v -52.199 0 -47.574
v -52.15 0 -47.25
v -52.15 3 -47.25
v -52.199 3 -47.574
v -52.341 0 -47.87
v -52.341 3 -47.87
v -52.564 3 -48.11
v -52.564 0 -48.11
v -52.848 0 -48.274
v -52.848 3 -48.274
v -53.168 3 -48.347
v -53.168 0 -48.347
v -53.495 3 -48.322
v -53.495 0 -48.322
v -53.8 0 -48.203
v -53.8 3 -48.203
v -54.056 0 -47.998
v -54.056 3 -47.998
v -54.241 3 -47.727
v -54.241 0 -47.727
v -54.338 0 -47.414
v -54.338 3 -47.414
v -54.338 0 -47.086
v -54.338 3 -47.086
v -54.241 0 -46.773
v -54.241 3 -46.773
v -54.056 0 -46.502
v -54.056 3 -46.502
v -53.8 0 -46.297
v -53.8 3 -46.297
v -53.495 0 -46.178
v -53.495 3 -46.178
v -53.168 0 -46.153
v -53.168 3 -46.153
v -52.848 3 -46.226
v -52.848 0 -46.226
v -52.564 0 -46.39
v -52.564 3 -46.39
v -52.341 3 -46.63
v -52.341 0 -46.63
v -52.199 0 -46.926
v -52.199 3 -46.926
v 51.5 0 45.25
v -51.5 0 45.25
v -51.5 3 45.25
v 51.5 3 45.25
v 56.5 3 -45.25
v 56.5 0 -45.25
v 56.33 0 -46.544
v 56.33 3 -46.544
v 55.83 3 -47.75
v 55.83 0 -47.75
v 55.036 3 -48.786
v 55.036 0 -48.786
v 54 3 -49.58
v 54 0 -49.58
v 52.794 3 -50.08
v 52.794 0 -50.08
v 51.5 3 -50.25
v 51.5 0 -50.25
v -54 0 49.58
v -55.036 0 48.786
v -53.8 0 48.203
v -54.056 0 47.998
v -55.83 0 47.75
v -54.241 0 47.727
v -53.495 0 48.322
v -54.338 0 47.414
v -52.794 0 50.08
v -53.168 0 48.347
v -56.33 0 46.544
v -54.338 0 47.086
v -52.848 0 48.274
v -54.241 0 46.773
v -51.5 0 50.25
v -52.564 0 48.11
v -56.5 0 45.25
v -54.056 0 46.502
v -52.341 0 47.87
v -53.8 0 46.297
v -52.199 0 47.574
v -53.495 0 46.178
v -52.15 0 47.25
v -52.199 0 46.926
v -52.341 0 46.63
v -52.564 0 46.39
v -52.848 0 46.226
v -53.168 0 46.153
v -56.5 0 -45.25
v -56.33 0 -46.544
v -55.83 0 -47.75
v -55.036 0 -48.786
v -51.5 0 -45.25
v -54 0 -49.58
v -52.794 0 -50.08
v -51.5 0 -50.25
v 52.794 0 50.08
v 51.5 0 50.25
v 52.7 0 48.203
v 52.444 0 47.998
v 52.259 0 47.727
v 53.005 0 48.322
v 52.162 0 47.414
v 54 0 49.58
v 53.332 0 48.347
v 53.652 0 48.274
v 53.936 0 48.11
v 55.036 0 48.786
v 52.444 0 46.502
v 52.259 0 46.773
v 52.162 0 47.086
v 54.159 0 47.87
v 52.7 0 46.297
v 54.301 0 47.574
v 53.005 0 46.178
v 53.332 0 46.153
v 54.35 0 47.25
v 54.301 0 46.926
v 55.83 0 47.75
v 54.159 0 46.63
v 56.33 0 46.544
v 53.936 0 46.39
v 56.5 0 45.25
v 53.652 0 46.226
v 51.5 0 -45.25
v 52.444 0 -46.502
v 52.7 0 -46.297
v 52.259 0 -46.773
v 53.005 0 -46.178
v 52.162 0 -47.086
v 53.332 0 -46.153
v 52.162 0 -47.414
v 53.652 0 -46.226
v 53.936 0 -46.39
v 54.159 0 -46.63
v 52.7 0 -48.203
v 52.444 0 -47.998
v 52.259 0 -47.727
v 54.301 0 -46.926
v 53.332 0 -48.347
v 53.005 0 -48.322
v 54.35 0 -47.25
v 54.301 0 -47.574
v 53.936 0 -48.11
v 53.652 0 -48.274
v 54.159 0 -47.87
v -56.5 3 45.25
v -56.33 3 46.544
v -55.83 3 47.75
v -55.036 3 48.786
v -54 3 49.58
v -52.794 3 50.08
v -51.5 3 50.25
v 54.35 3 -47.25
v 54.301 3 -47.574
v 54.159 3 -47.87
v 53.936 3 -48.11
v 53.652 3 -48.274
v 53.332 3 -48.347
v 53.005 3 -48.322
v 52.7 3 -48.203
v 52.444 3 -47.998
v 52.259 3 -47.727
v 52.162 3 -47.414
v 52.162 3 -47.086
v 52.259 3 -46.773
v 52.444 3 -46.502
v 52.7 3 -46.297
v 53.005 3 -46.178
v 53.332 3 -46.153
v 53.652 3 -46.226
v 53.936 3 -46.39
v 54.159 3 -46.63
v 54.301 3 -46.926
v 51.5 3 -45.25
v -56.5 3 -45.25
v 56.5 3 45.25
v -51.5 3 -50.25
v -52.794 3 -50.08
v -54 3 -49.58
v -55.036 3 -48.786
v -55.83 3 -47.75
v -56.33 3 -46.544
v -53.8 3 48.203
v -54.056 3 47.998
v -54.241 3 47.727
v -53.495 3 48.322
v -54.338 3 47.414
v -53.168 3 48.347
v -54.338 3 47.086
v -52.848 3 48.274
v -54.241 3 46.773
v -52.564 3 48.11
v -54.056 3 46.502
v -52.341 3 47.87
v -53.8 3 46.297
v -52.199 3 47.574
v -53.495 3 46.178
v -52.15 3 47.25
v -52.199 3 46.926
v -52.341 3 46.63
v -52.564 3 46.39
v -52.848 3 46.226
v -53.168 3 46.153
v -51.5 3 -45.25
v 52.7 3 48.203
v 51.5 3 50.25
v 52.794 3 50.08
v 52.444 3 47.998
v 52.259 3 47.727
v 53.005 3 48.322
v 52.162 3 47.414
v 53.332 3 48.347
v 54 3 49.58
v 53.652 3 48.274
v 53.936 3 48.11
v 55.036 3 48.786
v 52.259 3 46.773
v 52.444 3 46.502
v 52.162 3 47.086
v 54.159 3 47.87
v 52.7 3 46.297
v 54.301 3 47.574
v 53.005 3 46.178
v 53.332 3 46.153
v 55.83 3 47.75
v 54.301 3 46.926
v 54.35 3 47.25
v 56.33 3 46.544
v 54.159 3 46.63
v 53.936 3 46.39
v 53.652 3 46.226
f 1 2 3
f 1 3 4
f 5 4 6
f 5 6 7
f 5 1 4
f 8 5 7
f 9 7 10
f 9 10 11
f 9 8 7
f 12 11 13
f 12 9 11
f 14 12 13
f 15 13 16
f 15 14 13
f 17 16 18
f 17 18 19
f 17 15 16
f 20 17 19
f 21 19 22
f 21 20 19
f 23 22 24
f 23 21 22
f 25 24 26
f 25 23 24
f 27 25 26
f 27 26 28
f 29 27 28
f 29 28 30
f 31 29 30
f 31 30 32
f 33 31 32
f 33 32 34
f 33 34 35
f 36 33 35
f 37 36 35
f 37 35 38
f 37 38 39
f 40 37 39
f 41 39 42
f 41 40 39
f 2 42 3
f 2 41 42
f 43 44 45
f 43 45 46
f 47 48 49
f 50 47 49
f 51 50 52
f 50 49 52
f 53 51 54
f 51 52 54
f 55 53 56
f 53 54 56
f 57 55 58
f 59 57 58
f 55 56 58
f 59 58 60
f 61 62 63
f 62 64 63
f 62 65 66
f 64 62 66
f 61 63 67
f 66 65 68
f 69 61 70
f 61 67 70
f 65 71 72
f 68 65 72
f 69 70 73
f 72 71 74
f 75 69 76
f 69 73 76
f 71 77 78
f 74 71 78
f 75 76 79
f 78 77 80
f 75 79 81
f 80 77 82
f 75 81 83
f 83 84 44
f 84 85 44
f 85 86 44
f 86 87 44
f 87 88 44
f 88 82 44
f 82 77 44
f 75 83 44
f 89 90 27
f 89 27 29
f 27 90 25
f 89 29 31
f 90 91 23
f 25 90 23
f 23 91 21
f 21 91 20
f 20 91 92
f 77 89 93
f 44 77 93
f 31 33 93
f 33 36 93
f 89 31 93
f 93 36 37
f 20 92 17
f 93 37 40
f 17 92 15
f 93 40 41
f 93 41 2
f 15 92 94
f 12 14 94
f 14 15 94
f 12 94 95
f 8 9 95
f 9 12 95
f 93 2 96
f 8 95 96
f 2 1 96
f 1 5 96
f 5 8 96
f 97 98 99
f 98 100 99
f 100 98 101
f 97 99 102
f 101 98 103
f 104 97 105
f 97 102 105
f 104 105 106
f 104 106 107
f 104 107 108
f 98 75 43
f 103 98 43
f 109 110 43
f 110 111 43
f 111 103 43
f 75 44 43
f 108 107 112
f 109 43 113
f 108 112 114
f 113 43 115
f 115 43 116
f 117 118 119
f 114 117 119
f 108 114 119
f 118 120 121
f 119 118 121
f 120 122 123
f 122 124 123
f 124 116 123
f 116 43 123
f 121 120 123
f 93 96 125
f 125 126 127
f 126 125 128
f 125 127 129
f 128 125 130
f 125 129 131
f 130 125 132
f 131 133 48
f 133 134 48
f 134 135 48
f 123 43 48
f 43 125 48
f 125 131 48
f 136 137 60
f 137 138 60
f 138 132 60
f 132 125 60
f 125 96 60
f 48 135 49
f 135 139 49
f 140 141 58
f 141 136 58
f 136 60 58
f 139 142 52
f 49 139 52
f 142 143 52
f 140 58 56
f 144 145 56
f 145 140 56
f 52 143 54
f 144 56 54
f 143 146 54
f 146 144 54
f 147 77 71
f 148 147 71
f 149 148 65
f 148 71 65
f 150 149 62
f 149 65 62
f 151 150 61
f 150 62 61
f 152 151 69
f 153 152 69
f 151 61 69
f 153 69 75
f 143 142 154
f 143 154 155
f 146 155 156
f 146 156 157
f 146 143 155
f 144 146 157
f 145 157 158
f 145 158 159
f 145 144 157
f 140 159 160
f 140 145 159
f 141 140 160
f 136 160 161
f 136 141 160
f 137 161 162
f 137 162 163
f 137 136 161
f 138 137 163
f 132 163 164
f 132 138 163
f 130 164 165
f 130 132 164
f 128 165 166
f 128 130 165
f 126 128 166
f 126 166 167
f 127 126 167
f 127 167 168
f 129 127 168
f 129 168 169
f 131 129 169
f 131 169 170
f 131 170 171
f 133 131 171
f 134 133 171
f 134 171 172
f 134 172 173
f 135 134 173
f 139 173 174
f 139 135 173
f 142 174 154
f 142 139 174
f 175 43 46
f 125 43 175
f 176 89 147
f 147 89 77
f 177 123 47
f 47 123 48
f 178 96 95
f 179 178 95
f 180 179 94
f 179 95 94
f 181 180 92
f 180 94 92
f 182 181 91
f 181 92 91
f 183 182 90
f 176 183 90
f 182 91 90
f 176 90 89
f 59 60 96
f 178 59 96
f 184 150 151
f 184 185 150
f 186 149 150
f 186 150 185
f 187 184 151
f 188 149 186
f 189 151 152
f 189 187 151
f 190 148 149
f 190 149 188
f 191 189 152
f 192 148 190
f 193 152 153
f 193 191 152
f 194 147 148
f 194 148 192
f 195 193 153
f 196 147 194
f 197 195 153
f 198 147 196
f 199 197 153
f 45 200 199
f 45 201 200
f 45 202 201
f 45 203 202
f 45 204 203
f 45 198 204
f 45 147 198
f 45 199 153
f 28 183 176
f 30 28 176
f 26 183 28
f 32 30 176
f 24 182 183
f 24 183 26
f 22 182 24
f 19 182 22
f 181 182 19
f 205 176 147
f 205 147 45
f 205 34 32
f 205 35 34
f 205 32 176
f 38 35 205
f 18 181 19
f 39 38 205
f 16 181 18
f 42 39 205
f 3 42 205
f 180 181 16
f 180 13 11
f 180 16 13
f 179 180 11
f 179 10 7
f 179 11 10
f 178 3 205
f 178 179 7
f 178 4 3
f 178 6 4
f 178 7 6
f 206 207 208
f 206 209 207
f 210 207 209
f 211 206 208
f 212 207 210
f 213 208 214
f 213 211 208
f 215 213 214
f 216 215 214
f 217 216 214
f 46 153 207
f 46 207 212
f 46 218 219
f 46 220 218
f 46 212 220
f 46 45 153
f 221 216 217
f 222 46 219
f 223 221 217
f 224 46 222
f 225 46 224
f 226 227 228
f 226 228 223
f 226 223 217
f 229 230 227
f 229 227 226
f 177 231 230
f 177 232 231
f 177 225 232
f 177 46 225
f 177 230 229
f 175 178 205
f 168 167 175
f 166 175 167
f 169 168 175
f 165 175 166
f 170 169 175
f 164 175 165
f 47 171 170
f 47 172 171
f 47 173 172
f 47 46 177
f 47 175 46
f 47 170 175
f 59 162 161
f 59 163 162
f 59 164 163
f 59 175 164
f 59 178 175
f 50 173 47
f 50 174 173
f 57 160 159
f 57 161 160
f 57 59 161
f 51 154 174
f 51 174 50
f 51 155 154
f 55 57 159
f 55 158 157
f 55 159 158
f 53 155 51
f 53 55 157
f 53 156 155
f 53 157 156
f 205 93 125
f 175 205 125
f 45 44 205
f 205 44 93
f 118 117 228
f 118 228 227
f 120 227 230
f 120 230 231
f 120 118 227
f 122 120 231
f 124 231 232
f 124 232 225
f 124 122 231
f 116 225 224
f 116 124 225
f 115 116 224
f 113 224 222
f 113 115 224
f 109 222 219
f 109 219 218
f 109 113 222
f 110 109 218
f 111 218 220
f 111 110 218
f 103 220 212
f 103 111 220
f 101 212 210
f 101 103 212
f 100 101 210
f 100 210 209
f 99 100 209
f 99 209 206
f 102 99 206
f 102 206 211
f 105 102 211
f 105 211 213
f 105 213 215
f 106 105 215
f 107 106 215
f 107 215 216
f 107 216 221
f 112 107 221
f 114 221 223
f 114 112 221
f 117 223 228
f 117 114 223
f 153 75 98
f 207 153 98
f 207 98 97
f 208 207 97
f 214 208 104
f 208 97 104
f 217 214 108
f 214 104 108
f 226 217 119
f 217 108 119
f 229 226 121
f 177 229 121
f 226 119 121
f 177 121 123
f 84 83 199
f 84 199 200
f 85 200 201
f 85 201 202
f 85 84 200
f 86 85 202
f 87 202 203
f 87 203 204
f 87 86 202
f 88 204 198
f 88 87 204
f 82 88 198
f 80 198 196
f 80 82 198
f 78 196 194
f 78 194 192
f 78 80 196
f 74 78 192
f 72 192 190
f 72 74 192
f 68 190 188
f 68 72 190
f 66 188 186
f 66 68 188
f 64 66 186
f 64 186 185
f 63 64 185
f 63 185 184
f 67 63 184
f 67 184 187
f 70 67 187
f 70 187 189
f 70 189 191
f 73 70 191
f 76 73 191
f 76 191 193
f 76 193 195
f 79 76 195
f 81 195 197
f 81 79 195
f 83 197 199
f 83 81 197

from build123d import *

# Parameters (mm, degrees)
SKETCH1_R           = 1.1
SKETCH1_W           = 103
SKETCH1_H           = 90.5
BOSS_EXTRUDE1_DEPTH = 3


with BuildPart() as part:
    # Sketch1 → Boss-Extrude1 (new body)
    with BuildSketch(Plane(origin=(0, 0, 0), x_dir=(1, 0, 0), z_dir=(0, 1, 0))):
        with BuildLine():
            Line((-51.5, -50.25), (51.5, -50.25))
            ThreePointArc((51.5, -50.25), (55.035533906, -48.785533906), (56.5, -45.25))
            Line((56.5, -45.25), (56.5, 45.25))
            ThreePointArc((56.5, 45.25), (55.035533906, 48.785533906), (51.5, 50.25))
            Line((51.5, 50.25), (-51.5, 50.25))
            ThreePointArc((-51.5, 50.25), (-55.035533906, 48.785533906), (-56.5, 45.25))
            Line((-56.5, 45.25), (-56.5, -45.25))
            ThreePointArc((-56.5, -45.25), (-55.035533906, -48.785533906), (-51.5, -50.25))
        make_face()
        with Locations((-53.25, 47.25)):
            Circle(SKETCH1_R, mode=Mode.SUBTRACT)
        with Locations((53.25, 47.25)):
            Circle(SKETCH1_R, mode=Mode.SUBTRACT)
        with Locations((53.25, -47.25)):
            Circle(SKETCH1_R, mode=Mode.SUBTRACT)
        with Locations((-53.25, -47.25)):
            Circle(SKETCH1_R, mode=Mode.SUBTRACT)
        Rectangle(SKETCH1_W, SKETCH1_H, mode=Mode.SUBTRACT)
    extrude(amount=BOSS_EXTRUDE1_DEPTH)


solid = part.part
